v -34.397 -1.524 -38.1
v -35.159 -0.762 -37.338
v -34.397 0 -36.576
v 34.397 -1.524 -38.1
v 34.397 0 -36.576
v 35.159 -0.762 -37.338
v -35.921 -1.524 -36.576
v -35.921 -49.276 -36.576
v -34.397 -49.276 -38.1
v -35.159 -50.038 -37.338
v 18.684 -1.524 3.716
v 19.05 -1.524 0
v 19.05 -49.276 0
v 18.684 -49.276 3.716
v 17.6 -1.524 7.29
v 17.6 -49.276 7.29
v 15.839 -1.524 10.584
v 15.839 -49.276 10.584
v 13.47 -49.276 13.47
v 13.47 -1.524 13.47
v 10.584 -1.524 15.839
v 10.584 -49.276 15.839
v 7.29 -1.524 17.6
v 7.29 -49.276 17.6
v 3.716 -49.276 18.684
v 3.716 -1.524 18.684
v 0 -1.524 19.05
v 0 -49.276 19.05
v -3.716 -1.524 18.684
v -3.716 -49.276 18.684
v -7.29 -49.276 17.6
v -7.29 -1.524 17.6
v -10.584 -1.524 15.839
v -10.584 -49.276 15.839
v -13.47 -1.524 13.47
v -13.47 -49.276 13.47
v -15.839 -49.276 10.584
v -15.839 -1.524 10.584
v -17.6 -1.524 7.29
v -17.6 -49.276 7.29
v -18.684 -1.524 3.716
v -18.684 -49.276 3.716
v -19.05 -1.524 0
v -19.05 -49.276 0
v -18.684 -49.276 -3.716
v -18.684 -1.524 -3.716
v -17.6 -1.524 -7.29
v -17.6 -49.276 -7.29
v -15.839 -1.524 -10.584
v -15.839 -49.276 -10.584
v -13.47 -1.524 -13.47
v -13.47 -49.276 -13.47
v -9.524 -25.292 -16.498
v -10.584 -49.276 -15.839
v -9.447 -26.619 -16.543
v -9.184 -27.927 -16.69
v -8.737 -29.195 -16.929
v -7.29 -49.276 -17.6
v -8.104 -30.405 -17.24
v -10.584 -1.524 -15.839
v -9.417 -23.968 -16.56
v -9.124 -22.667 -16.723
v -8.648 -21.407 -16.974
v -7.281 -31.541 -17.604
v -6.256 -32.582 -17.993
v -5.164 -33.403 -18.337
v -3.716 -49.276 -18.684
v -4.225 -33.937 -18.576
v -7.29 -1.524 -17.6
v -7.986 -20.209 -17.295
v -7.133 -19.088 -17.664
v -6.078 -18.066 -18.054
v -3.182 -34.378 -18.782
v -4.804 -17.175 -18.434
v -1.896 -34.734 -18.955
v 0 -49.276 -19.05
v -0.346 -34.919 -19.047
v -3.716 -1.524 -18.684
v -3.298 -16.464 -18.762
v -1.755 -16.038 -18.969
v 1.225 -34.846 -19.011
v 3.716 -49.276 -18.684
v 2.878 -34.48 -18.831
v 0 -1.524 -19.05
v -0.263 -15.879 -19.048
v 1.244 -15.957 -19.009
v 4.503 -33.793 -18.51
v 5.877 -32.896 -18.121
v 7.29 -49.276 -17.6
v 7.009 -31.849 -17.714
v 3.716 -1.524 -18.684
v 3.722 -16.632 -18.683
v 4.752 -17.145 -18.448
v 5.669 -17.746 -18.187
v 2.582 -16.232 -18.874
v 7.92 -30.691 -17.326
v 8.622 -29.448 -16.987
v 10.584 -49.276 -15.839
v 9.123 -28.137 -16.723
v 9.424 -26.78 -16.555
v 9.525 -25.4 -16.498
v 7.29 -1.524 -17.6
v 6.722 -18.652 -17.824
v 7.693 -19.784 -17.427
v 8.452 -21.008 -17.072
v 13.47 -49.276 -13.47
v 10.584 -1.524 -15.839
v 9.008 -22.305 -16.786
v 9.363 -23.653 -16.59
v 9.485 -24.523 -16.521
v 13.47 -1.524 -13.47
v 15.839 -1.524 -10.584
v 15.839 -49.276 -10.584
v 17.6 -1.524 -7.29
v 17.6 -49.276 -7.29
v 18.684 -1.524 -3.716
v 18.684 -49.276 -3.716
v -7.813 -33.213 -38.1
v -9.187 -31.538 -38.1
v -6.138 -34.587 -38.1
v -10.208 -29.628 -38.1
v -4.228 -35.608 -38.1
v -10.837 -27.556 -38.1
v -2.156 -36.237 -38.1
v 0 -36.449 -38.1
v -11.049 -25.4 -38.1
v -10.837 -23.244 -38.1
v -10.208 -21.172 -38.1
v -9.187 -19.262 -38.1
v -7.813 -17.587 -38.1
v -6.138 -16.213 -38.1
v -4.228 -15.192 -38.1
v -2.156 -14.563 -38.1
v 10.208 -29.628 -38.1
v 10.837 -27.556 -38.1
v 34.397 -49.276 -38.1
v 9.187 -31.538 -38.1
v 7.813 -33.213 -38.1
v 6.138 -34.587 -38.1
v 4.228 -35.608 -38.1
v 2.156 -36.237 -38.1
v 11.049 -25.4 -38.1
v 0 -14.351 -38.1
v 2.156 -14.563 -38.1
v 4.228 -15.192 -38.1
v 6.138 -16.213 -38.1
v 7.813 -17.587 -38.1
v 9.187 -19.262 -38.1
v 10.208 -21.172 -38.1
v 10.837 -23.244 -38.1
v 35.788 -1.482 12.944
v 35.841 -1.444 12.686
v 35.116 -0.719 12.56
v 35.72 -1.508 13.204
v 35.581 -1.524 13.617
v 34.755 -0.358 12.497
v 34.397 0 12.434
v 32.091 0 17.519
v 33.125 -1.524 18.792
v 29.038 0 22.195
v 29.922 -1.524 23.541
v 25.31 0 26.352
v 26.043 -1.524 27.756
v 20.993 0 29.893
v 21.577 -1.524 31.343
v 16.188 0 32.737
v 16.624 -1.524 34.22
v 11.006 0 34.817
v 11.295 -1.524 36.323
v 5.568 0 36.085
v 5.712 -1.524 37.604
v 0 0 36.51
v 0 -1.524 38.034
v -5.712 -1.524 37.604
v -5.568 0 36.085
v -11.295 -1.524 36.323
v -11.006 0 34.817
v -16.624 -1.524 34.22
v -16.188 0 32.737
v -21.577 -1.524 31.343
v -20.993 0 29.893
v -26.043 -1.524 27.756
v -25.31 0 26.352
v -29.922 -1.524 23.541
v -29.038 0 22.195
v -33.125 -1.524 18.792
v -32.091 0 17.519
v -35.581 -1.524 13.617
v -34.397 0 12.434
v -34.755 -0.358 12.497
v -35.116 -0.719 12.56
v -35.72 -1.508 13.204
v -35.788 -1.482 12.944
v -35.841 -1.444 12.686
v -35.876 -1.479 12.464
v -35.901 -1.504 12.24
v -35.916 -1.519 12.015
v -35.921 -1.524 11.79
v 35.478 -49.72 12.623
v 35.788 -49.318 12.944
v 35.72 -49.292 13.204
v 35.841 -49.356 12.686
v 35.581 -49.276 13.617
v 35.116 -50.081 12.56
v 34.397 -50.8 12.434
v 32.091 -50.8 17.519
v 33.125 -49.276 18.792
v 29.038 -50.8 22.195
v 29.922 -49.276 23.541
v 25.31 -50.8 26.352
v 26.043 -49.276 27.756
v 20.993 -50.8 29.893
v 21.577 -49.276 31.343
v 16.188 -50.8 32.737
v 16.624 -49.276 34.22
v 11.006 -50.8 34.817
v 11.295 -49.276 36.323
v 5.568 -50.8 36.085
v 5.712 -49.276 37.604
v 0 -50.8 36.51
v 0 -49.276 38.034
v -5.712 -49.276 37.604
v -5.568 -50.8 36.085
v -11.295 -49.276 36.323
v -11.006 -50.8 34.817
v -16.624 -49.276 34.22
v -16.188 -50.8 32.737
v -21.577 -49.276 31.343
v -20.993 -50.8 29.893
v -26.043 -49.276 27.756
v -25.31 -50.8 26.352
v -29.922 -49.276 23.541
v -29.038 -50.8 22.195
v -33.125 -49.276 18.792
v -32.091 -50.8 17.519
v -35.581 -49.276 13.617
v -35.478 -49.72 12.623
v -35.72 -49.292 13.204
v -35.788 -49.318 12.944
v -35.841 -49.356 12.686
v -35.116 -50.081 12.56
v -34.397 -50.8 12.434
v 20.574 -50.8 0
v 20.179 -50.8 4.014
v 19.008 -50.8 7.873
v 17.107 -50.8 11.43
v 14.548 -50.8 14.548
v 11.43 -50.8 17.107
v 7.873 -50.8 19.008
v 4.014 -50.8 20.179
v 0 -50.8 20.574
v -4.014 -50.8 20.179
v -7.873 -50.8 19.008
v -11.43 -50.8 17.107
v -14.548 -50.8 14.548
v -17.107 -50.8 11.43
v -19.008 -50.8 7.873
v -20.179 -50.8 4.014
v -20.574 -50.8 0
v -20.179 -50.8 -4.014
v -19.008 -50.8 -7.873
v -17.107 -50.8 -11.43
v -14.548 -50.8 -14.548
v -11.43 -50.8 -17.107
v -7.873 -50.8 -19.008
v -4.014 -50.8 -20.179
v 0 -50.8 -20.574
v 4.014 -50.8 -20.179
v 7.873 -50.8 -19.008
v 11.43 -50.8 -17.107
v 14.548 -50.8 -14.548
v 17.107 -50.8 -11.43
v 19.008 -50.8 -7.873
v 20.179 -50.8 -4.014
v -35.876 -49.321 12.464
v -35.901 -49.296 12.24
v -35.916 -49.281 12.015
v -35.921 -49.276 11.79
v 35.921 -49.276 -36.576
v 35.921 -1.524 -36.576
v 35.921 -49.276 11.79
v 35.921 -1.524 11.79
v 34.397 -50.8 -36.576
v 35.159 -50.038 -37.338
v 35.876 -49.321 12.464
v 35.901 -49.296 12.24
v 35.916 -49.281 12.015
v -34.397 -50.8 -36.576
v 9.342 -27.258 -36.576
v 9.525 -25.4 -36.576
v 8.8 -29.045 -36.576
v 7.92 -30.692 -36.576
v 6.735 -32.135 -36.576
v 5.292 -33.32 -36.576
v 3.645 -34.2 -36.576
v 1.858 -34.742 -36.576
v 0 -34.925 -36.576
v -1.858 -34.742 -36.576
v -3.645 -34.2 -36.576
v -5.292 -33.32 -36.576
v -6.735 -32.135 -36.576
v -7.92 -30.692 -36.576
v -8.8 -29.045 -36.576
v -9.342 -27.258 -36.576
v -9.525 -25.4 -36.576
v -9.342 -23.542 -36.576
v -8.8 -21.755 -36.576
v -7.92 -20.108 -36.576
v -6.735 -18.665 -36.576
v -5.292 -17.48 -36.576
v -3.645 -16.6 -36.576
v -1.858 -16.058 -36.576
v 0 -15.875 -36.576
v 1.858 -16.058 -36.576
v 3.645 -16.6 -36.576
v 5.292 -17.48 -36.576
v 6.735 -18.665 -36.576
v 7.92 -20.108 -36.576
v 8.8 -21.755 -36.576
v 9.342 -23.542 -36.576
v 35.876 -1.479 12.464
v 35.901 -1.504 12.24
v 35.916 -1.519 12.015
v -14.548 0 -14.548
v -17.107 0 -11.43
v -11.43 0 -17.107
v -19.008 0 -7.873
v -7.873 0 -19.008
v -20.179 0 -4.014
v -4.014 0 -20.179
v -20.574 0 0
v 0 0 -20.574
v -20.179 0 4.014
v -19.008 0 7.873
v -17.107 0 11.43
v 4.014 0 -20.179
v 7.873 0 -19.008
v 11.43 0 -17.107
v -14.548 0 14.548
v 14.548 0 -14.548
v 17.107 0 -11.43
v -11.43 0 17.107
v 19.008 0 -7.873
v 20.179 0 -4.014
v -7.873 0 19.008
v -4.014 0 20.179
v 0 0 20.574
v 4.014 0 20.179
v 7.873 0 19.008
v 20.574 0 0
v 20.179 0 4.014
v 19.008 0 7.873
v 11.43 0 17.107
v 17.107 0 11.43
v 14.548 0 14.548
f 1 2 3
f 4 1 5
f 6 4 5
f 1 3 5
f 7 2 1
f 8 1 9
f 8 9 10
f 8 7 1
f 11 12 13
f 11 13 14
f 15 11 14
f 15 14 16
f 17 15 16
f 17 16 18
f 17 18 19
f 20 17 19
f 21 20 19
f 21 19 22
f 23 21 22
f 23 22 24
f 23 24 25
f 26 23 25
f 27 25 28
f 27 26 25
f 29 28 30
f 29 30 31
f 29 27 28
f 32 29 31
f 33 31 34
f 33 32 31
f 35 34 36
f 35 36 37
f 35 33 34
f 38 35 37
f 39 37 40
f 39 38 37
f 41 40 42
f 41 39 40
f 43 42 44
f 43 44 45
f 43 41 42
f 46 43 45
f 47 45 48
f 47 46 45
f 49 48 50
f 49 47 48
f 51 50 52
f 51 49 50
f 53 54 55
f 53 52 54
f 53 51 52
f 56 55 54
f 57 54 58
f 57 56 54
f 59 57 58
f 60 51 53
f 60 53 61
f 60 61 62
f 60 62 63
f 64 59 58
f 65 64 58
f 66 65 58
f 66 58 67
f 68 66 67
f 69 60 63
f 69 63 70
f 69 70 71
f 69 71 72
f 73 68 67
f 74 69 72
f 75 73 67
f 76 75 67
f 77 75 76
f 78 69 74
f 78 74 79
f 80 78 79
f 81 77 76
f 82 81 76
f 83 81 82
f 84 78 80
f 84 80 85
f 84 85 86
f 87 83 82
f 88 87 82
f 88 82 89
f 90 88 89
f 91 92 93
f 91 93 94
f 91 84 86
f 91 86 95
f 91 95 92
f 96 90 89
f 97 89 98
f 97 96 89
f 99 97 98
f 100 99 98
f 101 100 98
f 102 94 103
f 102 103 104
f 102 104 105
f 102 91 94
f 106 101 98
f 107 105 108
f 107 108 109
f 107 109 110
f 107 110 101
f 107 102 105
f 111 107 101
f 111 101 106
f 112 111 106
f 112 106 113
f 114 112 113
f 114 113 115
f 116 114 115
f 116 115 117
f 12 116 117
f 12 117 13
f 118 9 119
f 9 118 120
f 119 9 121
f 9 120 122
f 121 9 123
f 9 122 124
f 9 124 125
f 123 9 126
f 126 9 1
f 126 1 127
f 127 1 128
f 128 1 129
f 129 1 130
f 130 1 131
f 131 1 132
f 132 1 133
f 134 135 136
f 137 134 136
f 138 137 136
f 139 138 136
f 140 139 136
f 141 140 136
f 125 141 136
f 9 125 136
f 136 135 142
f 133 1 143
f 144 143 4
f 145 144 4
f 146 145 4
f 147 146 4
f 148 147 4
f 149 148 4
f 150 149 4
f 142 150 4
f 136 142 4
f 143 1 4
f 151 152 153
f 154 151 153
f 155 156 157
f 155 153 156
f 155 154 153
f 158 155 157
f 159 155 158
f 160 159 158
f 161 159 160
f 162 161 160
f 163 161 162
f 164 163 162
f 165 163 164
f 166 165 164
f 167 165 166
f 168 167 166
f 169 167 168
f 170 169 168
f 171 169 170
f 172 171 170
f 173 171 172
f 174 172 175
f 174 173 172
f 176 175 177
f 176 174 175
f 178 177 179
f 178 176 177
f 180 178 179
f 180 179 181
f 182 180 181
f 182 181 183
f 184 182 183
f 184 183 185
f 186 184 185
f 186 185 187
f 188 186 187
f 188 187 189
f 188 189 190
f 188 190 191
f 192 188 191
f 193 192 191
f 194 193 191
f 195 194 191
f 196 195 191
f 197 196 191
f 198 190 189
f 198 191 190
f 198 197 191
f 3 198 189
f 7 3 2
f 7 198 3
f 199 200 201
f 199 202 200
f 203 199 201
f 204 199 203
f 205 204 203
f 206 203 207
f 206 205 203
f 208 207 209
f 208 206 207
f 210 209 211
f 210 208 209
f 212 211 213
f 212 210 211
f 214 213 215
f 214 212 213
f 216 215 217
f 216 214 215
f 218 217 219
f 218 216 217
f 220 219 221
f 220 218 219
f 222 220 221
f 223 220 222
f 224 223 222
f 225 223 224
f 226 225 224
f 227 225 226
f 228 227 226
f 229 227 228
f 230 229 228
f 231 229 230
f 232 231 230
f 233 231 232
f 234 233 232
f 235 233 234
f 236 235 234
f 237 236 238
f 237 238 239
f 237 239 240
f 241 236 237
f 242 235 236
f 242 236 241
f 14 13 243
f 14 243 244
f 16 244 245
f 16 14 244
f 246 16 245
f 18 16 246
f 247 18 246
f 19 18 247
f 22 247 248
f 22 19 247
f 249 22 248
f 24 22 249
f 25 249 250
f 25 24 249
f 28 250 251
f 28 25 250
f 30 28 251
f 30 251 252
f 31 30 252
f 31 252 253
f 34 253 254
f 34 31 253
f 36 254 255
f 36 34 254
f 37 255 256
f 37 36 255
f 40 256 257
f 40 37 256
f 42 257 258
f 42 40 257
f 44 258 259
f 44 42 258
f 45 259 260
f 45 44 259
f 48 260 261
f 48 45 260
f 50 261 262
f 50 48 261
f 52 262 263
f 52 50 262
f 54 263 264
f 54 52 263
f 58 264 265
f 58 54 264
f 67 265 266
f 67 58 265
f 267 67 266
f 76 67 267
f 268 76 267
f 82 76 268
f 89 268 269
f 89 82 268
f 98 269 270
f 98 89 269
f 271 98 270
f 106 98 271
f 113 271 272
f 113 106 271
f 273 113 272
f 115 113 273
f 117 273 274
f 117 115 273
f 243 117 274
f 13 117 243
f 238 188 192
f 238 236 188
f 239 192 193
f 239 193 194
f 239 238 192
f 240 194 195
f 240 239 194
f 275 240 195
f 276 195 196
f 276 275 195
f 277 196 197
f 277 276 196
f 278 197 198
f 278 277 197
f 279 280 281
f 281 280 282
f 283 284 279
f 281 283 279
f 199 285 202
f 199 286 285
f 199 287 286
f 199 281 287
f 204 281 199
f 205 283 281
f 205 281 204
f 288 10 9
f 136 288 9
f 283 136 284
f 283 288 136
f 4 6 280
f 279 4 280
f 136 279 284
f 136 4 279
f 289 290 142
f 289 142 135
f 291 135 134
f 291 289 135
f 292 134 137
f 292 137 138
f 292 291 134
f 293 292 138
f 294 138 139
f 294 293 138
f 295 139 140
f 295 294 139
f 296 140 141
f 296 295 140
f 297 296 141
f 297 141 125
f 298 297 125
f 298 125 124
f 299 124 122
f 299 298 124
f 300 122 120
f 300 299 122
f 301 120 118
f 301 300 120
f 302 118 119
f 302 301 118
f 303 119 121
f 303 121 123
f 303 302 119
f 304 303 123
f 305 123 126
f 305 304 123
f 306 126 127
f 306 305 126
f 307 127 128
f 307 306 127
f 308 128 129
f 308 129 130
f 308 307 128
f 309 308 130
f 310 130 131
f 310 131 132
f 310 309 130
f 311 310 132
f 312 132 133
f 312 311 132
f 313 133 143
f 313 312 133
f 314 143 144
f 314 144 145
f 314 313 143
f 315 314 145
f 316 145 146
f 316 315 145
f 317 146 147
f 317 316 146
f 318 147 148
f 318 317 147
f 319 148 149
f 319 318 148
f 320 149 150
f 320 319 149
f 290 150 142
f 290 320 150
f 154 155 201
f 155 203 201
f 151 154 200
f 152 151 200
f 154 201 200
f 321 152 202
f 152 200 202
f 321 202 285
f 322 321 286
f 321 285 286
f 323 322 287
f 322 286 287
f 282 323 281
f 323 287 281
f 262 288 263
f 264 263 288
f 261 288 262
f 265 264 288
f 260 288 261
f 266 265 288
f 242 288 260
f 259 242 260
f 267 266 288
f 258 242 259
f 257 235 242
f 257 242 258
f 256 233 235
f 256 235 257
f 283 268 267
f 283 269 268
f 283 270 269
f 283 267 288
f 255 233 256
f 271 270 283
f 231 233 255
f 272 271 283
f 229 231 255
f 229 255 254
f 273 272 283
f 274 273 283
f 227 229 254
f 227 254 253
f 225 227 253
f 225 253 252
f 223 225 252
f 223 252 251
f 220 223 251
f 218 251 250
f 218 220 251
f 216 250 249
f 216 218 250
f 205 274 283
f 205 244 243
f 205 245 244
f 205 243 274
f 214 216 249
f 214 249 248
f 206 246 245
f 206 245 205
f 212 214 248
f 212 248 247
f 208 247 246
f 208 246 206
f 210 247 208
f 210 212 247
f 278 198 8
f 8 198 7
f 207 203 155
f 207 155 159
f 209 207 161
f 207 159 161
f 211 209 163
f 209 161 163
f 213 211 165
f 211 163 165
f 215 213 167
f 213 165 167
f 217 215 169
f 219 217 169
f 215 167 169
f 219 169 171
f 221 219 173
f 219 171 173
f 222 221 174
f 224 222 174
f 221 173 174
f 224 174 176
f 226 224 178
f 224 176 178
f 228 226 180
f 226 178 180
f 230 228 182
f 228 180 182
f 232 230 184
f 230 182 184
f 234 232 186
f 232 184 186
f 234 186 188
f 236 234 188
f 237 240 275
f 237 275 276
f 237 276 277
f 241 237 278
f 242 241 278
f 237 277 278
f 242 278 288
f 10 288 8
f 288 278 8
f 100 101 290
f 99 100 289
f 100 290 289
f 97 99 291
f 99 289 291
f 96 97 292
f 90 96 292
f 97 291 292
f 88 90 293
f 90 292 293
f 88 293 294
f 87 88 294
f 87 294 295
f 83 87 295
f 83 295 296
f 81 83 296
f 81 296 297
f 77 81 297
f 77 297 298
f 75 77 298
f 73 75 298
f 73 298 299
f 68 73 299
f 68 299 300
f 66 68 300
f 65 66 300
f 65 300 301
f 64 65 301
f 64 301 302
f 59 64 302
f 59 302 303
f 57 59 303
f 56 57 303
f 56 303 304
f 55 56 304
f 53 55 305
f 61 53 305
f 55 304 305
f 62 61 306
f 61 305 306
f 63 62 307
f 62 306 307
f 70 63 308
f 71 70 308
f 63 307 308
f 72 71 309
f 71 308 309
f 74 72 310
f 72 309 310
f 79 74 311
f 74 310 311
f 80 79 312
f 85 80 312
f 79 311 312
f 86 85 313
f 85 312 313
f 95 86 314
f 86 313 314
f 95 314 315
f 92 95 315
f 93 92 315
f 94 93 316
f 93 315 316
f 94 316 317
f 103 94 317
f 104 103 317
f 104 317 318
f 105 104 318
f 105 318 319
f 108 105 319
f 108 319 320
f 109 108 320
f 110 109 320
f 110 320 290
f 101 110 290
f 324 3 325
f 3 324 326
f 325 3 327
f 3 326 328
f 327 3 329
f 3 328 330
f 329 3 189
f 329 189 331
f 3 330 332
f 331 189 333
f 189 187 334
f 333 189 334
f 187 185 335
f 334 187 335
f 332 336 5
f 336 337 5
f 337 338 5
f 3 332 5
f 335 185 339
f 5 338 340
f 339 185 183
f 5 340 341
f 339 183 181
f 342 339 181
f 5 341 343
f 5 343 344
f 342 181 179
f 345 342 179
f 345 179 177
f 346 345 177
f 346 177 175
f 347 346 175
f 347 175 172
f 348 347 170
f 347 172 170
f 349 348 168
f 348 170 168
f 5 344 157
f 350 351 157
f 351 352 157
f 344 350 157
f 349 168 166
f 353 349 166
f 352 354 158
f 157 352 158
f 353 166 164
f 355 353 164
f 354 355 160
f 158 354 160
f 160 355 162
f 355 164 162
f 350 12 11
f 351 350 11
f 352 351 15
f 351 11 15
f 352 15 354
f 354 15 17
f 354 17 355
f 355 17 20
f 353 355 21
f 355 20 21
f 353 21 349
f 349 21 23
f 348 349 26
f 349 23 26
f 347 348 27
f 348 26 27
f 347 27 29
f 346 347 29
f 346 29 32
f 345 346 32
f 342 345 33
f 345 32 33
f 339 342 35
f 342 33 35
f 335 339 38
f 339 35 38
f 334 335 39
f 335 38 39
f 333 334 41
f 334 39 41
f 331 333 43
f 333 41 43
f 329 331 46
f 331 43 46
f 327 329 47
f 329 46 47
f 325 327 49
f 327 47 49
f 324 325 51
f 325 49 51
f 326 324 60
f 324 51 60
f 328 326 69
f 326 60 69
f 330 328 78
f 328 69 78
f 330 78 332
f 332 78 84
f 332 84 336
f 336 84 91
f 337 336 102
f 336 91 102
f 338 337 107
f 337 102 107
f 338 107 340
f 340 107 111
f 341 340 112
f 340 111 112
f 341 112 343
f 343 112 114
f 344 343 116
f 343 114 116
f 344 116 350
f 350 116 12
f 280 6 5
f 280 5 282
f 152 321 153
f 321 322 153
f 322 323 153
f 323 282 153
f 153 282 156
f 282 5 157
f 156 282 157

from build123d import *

# Parameters (mm, degrees)
F0_R     = 19.05
F1_DEPTH = 50.8
F2_R     = 9.525
F3_DEPTH = 25.4
F4_SIZE  = 1.524
F5_SIZE  = 1.524
F6_SIZE  = 1.524
F7_R     = 5.08
F8_R     = 5.08


with BuildPart() as f1:
    # F0 (on Front) → F1 (new body)
    with BuildSketch(Plane.XZ):
        with BuildLine():
            Line((35.921024, -38.1), (35.921024, 12.7))
            ThreePointArc((35.921024, 12.7), (0, 38.034383), (-35.921024, 12.7))
            Line((-35.921024, 12.7), (-35.921024, -38.1))
            Line((-35.921024, -38.1), (35.921024, -38.1))
        make_face()
        Circle(F0_R, mode=Mode.SUBTRACT)
    extrude(amount=F1_DEPTH)

    # F2 (on face) → F3 (cut)
    with BuildSketch(Plane(origin=(0, 0, -38.1), x_dir=(1, 0, 0), z_dir=(0, 0, -1))):
        with Locations((0, 25.4)):
            Circle(F2_R)
    extrude(amount=-F3_DEPTH, mode=Mode.SUBTRACT)

    # F4
    f4_edges = [f1.edges().sort_by_distance(p)[0] for p in [
        (0, -50.8, 38.034383),
        (-35.921024, -50.8, -12.7),
        (0, -50.8, -38.1),
        (35.921024, -50.8, -12.7),
        (-19.05, -50.8, 0),
    ]]
    chamfer(f4_edges, length=F4_SIZE)

    # F5
    f5_edges = [f1.edges().sort_by_distance(p)[0] for p in [
        (0, 0, 38.034383),
        (35.921024, 0, -12.7),
        (0, 0, -38.1),
        (-35.921024, 0, -12.7),
        (-19.05, 0, 0),
    ]]
    chamfer(f5_edges, length=F5_SIZE)

    # F6
    f6_edges = [f1.edges().sort_by_distance(p)[0] for p in [
        (35.921024, -25.4, -38.1),
        (-35.921024, -25.4, -38.1),
        (-9.525, -25.4, -38.1),
    ]]
    chamfer(f6_edges, length=F6_SIZE)

    # F7
    f7_edges = [f1.edges().sort_by_distance(p)[0] for p in [
        (-35.921024, -25.4, 12.7),
    ]]
    fillet(f7_edges, radius=F7_R)

    # F8
    f8_edges = [f1.edges().sort_by_distance(p)[0] for p in [
        (35.921024, -25.4, 12.7),
    ]]
    fillet(f8_edges, radius=F8_R)


solid = f1.part
